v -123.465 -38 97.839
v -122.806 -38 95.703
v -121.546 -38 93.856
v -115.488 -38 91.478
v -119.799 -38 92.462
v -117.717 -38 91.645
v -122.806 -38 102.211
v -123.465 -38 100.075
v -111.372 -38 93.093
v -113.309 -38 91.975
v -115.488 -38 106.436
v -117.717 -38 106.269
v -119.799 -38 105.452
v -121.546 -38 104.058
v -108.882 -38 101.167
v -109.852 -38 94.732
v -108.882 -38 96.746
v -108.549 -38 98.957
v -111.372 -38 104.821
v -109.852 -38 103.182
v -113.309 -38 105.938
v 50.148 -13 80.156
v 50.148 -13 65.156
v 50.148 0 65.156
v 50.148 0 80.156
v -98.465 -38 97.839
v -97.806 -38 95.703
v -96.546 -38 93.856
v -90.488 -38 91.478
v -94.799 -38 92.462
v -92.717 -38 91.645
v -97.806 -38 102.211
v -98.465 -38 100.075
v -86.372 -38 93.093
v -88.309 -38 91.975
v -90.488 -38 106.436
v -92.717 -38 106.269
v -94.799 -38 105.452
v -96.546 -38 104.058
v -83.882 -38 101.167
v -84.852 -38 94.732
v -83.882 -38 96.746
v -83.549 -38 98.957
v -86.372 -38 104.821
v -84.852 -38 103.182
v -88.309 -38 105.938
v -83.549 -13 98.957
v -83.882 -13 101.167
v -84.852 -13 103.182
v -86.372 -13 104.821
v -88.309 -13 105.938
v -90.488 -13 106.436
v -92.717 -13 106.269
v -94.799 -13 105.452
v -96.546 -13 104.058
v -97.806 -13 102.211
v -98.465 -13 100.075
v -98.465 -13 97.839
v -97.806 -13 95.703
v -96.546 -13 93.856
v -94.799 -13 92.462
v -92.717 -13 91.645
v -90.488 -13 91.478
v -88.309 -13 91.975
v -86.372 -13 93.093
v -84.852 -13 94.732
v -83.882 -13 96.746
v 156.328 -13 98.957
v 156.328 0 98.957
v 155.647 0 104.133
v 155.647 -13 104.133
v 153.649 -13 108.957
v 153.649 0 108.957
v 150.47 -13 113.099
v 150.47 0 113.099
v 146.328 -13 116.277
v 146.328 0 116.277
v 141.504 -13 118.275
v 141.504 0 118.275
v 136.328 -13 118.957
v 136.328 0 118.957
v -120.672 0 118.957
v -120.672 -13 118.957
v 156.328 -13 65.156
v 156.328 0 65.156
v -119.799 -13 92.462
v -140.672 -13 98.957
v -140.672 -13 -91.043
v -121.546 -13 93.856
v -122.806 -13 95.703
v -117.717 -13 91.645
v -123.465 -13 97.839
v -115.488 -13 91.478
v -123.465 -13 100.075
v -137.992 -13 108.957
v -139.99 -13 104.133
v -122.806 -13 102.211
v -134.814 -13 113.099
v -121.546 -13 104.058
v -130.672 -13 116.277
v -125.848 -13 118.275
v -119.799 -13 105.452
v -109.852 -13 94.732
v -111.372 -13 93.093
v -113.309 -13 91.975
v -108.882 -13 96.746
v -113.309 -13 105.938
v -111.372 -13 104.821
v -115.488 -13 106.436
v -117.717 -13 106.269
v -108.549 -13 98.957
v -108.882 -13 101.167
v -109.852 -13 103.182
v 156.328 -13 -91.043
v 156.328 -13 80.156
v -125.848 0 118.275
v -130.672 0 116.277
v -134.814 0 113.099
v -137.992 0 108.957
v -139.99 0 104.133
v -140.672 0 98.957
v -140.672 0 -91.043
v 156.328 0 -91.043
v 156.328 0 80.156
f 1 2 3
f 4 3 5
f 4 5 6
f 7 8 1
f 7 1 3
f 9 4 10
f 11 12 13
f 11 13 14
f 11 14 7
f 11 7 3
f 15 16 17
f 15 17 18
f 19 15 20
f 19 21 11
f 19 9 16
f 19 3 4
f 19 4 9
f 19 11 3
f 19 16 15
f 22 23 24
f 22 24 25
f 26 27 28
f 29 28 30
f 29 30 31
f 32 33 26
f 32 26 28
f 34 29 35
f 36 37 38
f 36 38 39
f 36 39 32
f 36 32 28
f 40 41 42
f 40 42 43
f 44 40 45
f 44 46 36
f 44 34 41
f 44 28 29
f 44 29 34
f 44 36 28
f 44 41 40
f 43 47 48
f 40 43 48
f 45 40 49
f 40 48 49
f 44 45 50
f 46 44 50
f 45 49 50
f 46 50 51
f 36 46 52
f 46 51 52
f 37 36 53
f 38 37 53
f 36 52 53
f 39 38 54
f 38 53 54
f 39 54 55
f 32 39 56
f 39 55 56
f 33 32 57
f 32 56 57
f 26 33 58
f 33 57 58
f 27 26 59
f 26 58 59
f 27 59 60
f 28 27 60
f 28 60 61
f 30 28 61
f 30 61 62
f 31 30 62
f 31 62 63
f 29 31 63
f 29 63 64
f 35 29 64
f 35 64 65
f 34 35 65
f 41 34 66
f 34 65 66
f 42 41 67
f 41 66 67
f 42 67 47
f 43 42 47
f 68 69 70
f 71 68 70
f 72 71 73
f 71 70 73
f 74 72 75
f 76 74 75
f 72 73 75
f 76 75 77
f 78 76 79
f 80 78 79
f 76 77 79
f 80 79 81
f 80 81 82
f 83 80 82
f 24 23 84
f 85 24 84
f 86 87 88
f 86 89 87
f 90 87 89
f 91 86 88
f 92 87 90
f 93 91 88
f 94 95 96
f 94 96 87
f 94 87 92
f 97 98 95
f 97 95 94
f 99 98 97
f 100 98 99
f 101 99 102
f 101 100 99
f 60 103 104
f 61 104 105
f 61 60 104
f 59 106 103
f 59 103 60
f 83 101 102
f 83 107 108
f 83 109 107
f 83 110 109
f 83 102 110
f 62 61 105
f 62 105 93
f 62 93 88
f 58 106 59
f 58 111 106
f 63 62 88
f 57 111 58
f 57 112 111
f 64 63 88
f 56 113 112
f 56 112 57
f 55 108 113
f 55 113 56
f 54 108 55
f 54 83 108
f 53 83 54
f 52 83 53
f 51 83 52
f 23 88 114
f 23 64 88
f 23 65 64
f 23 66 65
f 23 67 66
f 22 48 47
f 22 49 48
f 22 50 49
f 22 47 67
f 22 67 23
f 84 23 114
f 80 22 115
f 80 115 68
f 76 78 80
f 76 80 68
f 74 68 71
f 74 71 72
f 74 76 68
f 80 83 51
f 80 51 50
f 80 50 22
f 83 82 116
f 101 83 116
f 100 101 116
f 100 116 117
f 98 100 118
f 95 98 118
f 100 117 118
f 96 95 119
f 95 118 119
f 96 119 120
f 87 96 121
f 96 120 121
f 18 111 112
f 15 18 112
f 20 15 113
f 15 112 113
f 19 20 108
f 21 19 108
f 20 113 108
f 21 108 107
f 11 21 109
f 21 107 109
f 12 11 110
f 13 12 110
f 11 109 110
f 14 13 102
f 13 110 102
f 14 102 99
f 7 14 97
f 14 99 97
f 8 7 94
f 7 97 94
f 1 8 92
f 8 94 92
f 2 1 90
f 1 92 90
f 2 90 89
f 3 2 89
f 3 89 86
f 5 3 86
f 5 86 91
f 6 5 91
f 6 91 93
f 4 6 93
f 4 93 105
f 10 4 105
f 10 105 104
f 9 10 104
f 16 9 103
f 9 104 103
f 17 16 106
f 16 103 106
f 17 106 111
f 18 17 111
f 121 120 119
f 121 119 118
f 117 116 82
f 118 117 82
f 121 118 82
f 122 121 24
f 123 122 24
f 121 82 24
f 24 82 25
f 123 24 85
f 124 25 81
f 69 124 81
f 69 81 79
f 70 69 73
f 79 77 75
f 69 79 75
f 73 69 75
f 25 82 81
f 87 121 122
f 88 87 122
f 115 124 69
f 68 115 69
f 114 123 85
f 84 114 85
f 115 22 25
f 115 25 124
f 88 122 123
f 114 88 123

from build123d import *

# Parameters (mm, degrees)
F1_DEPTH = 13
F2_W     = 110
F2_H     = 15
F3_DEPTH = 25
F4_R     = 7.5
F5_DEPTH = 25


with BuildPart() as f1:
    # F0 (on Front) → F1 (new body)
    with BuildSketch(Plane.XZ):
        with BuildLine():
            Line((136.328066, 118.956802), (-120.671934, 118.956802))
            ThreePointArc((-120.671934, 118.956802), (-134.814069, 113.098938), (-140.671934, 98.956802))
            Line((-140.671934, 98.956802), (-140.671934, -91.043198))
            Line((-140.671934, -91.043198), (156.328066, -91.043198))
            Line((156.328066, -91.043198), (156.328066, 98.956802))
            ThreePointArc((156.328066, 98.956802), (150.470202, 113.098938), (136.328066, 118.956802))
        make_face()
    extrude(amount=F1_DEPTH)

    # F2 (on face) → F3 (cut)
    with BuildSketch(Plane.XZ.offset(13)):
        with Locations((105.148206, 72.65589)):
            Rectangle(F2_W, F2_H)
    extrude(amount=-F3_DEPTH, mode=Mode.SUBTRACT)

    # F4 (on face) → F5 (join)
    with BuildSketch(Plane.XZ.offset(13)):
        with Locations((-116.048563, 98.956802)):
            Circle(F4_R)
        with Locations((-91.048563, 98.956802)):
            Circle(F4_R)
    extrude(amount=F5_DEPTH)


solid = f1.part
